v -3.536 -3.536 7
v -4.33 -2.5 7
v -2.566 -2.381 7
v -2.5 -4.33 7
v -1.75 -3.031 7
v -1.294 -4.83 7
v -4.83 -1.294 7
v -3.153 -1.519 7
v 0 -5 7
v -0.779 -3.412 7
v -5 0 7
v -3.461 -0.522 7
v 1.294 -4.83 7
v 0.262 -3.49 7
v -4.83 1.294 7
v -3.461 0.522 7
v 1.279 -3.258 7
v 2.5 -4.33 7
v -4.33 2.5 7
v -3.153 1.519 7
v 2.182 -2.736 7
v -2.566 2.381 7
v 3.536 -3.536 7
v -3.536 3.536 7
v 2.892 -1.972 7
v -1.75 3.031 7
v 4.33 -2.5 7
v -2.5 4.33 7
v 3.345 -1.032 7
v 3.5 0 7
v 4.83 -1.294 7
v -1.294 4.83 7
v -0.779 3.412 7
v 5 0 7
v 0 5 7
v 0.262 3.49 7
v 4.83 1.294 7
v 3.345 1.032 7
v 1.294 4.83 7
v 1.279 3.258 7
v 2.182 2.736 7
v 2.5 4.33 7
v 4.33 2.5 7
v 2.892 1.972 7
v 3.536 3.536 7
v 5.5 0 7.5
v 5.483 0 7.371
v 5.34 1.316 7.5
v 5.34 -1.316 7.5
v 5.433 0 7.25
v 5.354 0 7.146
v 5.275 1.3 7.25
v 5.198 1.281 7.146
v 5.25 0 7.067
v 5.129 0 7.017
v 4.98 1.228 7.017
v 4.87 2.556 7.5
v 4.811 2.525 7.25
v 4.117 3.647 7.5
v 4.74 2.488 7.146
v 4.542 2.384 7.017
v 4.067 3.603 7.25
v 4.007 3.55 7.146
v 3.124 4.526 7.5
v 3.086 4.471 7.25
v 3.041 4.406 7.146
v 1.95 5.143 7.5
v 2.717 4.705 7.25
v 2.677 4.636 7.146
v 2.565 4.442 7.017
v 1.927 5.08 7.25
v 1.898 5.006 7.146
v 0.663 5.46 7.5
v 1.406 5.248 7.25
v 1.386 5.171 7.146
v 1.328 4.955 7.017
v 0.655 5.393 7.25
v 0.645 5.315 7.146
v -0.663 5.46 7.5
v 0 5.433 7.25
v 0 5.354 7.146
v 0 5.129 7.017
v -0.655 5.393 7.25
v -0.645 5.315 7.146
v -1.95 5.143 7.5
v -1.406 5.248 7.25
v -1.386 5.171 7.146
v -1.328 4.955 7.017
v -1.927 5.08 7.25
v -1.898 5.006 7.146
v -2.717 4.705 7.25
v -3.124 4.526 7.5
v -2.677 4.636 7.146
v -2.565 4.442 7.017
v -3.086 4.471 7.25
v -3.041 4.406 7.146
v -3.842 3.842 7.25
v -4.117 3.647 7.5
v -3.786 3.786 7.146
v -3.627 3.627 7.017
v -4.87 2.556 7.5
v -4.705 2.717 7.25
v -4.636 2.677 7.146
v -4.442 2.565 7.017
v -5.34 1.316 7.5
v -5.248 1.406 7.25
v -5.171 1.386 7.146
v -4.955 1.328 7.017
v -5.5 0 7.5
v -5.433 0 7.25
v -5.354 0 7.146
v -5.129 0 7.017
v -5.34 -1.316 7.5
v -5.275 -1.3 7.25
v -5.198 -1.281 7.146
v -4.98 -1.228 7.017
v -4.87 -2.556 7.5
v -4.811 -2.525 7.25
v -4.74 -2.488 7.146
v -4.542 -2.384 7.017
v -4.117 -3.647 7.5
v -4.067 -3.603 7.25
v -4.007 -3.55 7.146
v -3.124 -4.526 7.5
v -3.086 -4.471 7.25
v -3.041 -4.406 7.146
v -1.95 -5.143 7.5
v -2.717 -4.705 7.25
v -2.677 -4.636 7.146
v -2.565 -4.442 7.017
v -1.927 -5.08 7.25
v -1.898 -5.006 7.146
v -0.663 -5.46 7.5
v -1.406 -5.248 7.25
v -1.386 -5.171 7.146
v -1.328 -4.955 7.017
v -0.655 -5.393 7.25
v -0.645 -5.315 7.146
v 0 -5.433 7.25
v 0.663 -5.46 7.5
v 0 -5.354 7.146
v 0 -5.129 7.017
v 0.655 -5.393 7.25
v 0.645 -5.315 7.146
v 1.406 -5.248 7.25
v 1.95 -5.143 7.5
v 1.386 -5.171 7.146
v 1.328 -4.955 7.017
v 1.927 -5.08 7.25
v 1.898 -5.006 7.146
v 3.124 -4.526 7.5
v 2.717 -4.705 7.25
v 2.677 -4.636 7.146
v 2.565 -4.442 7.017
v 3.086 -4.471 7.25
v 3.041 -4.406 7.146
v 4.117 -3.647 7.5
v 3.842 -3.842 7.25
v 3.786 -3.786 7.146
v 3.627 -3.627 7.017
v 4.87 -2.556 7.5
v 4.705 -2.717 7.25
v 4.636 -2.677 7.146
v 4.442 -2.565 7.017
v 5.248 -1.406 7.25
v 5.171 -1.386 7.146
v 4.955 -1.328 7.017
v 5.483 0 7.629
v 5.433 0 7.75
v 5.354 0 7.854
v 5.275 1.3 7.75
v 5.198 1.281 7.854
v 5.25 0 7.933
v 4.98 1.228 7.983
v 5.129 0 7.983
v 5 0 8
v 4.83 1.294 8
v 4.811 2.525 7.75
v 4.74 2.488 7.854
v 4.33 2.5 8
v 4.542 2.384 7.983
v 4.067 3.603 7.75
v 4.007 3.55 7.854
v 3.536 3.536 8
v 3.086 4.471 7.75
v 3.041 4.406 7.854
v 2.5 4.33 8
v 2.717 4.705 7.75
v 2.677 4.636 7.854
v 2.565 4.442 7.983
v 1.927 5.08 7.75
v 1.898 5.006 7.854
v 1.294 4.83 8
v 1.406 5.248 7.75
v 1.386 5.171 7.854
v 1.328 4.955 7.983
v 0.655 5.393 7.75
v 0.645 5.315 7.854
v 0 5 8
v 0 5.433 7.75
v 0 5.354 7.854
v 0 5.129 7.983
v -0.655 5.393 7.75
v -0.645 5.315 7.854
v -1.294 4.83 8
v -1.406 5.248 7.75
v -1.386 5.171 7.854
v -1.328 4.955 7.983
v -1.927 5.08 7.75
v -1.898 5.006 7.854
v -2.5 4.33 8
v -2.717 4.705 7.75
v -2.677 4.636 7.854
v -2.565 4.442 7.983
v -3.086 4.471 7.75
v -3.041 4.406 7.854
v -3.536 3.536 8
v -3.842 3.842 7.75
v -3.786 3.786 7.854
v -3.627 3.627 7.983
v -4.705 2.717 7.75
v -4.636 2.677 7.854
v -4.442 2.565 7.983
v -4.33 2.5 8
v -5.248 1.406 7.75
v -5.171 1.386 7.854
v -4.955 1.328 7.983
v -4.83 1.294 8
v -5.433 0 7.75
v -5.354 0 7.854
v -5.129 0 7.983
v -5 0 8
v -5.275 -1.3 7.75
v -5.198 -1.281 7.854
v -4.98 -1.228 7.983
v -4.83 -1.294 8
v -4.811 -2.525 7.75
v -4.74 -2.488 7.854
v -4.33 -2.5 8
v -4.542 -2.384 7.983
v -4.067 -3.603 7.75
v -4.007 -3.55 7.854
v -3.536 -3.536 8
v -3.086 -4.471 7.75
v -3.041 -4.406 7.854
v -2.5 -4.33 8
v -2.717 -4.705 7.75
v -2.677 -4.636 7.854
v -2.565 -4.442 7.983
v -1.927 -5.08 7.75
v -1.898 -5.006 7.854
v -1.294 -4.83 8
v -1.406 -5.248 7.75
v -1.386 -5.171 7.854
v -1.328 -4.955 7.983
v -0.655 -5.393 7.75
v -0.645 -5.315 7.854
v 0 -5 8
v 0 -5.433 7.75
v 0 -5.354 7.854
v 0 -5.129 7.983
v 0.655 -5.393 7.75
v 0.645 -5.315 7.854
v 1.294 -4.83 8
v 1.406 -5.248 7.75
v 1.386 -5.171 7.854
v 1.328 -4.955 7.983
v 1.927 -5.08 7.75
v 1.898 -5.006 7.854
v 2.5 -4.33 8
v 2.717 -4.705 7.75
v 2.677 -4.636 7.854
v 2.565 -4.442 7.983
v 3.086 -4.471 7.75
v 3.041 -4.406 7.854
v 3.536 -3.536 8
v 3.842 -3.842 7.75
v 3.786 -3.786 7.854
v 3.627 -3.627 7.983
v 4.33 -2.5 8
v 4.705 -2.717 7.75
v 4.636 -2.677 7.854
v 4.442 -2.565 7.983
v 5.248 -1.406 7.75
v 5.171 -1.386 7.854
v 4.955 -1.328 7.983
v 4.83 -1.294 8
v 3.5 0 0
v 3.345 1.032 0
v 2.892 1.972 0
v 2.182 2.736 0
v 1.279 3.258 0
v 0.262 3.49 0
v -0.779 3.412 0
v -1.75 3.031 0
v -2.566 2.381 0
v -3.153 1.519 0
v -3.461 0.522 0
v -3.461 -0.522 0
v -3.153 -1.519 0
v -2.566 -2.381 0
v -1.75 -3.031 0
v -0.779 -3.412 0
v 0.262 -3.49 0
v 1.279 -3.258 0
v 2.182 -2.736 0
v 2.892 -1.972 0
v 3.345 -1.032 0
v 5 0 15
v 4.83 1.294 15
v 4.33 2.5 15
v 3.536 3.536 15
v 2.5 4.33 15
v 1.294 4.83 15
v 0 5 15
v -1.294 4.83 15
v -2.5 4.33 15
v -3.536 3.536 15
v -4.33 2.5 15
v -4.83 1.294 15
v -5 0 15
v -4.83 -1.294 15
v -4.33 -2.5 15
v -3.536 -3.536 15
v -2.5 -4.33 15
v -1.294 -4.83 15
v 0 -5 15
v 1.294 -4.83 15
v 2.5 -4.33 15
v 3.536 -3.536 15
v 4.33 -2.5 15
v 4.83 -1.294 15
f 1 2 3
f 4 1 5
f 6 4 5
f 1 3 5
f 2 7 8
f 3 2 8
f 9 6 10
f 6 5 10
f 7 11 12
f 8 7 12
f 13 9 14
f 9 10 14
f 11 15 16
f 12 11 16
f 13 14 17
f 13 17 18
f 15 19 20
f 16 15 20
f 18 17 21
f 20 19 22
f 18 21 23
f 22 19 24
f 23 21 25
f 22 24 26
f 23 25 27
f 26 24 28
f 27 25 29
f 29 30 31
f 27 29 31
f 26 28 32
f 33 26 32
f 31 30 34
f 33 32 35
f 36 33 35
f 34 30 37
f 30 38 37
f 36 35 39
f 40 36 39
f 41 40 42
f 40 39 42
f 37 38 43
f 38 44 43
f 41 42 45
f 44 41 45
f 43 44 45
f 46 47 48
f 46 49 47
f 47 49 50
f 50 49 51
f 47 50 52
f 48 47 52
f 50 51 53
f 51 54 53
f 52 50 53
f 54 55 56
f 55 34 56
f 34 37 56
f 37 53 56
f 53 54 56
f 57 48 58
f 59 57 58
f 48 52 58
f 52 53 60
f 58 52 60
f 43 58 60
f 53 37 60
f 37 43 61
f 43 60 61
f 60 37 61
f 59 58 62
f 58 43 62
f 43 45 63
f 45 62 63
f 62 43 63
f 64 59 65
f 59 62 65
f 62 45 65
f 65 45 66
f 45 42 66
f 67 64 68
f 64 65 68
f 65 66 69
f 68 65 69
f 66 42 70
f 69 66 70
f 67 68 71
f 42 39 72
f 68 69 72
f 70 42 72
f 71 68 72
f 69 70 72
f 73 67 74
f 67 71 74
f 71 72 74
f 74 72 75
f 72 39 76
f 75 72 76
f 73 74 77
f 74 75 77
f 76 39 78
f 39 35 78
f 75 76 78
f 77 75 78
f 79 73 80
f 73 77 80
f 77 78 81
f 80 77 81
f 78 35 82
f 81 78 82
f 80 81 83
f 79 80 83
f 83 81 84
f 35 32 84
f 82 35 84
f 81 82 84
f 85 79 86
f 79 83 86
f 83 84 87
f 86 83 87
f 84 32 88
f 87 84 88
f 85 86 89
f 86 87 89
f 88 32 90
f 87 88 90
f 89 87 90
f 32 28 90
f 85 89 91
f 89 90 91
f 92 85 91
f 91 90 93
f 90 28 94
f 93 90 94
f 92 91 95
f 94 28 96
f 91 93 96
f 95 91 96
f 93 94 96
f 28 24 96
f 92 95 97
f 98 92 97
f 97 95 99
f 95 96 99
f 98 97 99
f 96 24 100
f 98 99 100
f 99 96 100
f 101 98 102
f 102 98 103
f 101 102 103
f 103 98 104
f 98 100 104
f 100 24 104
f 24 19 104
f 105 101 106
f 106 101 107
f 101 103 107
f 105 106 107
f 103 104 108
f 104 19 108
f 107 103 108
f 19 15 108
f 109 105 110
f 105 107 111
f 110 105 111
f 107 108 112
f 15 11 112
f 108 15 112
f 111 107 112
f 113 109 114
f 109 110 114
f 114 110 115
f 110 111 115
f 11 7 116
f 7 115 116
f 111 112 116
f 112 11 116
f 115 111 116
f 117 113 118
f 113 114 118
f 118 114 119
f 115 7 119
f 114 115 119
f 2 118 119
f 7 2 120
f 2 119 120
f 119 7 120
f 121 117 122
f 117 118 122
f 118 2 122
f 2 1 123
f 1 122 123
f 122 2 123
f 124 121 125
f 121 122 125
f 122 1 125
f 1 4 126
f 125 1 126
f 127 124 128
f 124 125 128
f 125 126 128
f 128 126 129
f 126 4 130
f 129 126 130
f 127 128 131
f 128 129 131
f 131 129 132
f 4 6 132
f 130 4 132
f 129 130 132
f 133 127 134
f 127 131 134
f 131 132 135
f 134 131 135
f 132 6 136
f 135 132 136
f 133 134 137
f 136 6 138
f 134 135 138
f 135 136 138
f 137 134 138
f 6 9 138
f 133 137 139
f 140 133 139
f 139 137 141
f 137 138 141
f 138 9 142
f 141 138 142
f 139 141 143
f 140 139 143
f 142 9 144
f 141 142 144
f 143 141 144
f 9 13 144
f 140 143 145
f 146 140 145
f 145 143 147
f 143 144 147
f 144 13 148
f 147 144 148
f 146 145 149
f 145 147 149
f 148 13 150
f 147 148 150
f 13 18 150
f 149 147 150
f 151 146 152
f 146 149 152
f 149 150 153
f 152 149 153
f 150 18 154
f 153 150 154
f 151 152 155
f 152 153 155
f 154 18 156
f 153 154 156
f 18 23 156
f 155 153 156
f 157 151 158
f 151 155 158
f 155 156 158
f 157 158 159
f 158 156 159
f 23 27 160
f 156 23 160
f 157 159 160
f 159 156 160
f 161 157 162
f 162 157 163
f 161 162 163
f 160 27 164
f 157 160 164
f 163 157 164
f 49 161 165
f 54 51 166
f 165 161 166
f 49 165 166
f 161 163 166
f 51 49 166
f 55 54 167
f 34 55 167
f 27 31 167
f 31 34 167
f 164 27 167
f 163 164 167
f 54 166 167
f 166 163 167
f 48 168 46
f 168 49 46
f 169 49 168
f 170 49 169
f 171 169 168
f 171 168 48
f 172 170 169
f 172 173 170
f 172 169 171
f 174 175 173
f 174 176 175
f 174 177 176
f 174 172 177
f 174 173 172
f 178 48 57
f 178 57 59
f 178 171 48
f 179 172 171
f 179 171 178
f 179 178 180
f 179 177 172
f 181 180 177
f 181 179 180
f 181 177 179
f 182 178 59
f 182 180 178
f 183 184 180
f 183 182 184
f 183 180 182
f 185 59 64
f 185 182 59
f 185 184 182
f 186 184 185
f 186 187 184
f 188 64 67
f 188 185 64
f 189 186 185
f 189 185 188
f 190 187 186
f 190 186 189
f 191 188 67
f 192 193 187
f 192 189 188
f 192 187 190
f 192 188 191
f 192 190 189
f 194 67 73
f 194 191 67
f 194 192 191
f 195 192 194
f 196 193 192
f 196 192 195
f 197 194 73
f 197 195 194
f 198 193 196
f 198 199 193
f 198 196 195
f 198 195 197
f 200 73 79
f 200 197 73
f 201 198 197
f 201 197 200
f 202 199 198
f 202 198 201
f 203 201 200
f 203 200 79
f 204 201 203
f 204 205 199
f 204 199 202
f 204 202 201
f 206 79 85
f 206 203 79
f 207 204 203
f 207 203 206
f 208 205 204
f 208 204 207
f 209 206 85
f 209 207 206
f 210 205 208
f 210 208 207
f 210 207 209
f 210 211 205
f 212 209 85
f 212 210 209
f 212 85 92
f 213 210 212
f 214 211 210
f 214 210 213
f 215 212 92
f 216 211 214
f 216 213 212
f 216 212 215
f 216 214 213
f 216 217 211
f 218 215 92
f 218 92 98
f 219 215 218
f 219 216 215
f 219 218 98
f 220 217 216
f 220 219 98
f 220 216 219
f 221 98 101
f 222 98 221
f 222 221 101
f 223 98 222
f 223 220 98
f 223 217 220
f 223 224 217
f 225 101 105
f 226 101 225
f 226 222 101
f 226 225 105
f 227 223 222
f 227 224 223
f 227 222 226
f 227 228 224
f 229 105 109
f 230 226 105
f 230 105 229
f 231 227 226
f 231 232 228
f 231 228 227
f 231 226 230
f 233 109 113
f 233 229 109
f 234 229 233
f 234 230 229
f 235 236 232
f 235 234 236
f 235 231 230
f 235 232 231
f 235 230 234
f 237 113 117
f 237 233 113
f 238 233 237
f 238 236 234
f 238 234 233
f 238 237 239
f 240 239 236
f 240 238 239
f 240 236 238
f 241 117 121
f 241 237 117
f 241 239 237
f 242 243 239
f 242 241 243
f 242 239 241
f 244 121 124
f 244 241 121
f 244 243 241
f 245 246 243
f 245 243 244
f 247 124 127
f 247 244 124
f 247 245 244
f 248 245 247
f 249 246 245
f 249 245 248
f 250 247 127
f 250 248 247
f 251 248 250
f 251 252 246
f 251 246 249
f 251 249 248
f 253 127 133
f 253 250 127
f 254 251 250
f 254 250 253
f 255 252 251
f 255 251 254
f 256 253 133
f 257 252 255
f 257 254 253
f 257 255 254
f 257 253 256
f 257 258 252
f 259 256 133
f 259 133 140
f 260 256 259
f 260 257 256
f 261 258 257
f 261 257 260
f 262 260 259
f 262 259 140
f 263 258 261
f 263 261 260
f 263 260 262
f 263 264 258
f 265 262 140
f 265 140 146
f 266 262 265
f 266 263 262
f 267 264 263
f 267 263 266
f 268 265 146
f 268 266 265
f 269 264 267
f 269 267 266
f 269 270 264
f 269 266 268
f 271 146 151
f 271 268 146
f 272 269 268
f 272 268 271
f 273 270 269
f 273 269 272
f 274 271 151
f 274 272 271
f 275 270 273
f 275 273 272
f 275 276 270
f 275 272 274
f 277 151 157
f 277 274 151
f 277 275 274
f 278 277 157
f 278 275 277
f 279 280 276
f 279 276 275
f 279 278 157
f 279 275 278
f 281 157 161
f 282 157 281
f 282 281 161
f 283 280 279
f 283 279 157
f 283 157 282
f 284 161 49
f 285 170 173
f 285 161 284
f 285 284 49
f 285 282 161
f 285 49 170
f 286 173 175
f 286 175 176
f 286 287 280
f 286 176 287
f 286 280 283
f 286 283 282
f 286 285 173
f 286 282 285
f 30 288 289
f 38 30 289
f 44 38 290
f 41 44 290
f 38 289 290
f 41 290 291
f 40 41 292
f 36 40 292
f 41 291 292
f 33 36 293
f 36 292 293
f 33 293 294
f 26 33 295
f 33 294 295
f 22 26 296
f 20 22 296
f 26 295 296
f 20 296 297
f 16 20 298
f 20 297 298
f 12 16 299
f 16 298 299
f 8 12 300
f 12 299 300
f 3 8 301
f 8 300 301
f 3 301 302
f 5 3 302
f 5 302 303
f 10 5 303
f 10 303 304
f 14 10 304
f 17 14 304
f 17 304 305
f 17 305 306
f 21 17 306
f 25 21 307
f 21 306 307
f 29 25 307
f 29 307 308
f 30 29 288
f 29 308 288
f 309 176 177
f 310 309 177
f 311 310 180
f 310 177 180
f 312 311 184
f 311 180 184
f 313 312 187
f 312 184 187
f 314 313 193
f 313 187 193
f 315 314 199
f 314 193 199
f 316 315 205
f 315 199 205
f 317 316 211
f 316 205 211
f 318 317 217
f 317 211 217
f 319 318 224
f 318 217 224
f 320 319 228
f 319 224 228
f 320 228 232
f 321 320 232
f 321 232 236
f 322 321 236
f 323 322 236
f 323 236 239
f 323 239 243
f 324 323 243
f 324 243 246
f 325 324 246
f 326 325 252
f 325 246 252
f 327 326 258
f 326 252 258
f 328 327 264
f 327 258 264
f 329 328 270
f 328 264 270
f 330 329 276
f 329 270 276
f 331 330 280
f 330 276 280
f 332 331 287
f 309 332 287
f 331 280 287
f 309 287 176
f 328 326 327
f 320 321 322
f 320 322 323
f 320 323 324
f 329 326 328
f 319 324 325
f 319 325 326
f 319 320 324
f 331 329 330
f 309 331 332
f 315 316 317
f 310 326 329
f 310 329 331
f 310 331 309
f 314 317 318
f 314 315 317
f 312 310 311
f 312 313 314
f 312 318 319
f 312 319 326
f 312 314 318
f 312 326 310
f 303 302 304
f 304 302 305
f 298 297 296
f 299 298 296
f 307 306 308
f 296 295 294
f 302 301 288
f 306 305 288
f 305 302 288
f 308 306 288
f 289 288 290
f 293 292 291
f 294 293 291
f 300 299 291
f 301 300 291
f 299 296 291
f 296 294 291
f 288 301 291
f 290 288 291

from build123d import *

# Parameters (mm, degrees)
F0_R     = 3.5
F1_DEPTH = 7
F2_R     = 5.5
F3_DEPTH = 1
F5_R     = 0.49999
F4_R     = 5
F6_DEPTH = 7


# Not quite as in the source:
# - a fillet or chamfer is up to 0.001 mm smaller than in the source, because OpenCascade refuses the exact size


with BuildPart() as f1:
    # F0 (on Top) → F1 (new body)
    with BuildSketch(Plane.XY):
        Circle(F0_R)
    extrude(amount=F1_DEPTH)

    # F2 (on face) → F3 (join)
    with BuildSketch(Plane.XY.offset(7)):
        Circle(F2_R)
    extrude(amount=F3_DEPTH)

    # F5 (radius 0.5 in the source; OpenCascade refuses exactly that, so slightly less here)
    f5_edges = [f1.edges().sort_by_distance(p)[0] for p in [
        (-5.5, 0, 8),
        (-5.5, 0, 7),
    ]]
    fillet(f5_edges, radius=F5_R)

    # F4 (on face) → F6 (join)
    with BuildSketch(Plane.XY.offset(8)):
        Circle(F4_R)
    extrude(amount=F6_DEPTH)


solid = f1.part
